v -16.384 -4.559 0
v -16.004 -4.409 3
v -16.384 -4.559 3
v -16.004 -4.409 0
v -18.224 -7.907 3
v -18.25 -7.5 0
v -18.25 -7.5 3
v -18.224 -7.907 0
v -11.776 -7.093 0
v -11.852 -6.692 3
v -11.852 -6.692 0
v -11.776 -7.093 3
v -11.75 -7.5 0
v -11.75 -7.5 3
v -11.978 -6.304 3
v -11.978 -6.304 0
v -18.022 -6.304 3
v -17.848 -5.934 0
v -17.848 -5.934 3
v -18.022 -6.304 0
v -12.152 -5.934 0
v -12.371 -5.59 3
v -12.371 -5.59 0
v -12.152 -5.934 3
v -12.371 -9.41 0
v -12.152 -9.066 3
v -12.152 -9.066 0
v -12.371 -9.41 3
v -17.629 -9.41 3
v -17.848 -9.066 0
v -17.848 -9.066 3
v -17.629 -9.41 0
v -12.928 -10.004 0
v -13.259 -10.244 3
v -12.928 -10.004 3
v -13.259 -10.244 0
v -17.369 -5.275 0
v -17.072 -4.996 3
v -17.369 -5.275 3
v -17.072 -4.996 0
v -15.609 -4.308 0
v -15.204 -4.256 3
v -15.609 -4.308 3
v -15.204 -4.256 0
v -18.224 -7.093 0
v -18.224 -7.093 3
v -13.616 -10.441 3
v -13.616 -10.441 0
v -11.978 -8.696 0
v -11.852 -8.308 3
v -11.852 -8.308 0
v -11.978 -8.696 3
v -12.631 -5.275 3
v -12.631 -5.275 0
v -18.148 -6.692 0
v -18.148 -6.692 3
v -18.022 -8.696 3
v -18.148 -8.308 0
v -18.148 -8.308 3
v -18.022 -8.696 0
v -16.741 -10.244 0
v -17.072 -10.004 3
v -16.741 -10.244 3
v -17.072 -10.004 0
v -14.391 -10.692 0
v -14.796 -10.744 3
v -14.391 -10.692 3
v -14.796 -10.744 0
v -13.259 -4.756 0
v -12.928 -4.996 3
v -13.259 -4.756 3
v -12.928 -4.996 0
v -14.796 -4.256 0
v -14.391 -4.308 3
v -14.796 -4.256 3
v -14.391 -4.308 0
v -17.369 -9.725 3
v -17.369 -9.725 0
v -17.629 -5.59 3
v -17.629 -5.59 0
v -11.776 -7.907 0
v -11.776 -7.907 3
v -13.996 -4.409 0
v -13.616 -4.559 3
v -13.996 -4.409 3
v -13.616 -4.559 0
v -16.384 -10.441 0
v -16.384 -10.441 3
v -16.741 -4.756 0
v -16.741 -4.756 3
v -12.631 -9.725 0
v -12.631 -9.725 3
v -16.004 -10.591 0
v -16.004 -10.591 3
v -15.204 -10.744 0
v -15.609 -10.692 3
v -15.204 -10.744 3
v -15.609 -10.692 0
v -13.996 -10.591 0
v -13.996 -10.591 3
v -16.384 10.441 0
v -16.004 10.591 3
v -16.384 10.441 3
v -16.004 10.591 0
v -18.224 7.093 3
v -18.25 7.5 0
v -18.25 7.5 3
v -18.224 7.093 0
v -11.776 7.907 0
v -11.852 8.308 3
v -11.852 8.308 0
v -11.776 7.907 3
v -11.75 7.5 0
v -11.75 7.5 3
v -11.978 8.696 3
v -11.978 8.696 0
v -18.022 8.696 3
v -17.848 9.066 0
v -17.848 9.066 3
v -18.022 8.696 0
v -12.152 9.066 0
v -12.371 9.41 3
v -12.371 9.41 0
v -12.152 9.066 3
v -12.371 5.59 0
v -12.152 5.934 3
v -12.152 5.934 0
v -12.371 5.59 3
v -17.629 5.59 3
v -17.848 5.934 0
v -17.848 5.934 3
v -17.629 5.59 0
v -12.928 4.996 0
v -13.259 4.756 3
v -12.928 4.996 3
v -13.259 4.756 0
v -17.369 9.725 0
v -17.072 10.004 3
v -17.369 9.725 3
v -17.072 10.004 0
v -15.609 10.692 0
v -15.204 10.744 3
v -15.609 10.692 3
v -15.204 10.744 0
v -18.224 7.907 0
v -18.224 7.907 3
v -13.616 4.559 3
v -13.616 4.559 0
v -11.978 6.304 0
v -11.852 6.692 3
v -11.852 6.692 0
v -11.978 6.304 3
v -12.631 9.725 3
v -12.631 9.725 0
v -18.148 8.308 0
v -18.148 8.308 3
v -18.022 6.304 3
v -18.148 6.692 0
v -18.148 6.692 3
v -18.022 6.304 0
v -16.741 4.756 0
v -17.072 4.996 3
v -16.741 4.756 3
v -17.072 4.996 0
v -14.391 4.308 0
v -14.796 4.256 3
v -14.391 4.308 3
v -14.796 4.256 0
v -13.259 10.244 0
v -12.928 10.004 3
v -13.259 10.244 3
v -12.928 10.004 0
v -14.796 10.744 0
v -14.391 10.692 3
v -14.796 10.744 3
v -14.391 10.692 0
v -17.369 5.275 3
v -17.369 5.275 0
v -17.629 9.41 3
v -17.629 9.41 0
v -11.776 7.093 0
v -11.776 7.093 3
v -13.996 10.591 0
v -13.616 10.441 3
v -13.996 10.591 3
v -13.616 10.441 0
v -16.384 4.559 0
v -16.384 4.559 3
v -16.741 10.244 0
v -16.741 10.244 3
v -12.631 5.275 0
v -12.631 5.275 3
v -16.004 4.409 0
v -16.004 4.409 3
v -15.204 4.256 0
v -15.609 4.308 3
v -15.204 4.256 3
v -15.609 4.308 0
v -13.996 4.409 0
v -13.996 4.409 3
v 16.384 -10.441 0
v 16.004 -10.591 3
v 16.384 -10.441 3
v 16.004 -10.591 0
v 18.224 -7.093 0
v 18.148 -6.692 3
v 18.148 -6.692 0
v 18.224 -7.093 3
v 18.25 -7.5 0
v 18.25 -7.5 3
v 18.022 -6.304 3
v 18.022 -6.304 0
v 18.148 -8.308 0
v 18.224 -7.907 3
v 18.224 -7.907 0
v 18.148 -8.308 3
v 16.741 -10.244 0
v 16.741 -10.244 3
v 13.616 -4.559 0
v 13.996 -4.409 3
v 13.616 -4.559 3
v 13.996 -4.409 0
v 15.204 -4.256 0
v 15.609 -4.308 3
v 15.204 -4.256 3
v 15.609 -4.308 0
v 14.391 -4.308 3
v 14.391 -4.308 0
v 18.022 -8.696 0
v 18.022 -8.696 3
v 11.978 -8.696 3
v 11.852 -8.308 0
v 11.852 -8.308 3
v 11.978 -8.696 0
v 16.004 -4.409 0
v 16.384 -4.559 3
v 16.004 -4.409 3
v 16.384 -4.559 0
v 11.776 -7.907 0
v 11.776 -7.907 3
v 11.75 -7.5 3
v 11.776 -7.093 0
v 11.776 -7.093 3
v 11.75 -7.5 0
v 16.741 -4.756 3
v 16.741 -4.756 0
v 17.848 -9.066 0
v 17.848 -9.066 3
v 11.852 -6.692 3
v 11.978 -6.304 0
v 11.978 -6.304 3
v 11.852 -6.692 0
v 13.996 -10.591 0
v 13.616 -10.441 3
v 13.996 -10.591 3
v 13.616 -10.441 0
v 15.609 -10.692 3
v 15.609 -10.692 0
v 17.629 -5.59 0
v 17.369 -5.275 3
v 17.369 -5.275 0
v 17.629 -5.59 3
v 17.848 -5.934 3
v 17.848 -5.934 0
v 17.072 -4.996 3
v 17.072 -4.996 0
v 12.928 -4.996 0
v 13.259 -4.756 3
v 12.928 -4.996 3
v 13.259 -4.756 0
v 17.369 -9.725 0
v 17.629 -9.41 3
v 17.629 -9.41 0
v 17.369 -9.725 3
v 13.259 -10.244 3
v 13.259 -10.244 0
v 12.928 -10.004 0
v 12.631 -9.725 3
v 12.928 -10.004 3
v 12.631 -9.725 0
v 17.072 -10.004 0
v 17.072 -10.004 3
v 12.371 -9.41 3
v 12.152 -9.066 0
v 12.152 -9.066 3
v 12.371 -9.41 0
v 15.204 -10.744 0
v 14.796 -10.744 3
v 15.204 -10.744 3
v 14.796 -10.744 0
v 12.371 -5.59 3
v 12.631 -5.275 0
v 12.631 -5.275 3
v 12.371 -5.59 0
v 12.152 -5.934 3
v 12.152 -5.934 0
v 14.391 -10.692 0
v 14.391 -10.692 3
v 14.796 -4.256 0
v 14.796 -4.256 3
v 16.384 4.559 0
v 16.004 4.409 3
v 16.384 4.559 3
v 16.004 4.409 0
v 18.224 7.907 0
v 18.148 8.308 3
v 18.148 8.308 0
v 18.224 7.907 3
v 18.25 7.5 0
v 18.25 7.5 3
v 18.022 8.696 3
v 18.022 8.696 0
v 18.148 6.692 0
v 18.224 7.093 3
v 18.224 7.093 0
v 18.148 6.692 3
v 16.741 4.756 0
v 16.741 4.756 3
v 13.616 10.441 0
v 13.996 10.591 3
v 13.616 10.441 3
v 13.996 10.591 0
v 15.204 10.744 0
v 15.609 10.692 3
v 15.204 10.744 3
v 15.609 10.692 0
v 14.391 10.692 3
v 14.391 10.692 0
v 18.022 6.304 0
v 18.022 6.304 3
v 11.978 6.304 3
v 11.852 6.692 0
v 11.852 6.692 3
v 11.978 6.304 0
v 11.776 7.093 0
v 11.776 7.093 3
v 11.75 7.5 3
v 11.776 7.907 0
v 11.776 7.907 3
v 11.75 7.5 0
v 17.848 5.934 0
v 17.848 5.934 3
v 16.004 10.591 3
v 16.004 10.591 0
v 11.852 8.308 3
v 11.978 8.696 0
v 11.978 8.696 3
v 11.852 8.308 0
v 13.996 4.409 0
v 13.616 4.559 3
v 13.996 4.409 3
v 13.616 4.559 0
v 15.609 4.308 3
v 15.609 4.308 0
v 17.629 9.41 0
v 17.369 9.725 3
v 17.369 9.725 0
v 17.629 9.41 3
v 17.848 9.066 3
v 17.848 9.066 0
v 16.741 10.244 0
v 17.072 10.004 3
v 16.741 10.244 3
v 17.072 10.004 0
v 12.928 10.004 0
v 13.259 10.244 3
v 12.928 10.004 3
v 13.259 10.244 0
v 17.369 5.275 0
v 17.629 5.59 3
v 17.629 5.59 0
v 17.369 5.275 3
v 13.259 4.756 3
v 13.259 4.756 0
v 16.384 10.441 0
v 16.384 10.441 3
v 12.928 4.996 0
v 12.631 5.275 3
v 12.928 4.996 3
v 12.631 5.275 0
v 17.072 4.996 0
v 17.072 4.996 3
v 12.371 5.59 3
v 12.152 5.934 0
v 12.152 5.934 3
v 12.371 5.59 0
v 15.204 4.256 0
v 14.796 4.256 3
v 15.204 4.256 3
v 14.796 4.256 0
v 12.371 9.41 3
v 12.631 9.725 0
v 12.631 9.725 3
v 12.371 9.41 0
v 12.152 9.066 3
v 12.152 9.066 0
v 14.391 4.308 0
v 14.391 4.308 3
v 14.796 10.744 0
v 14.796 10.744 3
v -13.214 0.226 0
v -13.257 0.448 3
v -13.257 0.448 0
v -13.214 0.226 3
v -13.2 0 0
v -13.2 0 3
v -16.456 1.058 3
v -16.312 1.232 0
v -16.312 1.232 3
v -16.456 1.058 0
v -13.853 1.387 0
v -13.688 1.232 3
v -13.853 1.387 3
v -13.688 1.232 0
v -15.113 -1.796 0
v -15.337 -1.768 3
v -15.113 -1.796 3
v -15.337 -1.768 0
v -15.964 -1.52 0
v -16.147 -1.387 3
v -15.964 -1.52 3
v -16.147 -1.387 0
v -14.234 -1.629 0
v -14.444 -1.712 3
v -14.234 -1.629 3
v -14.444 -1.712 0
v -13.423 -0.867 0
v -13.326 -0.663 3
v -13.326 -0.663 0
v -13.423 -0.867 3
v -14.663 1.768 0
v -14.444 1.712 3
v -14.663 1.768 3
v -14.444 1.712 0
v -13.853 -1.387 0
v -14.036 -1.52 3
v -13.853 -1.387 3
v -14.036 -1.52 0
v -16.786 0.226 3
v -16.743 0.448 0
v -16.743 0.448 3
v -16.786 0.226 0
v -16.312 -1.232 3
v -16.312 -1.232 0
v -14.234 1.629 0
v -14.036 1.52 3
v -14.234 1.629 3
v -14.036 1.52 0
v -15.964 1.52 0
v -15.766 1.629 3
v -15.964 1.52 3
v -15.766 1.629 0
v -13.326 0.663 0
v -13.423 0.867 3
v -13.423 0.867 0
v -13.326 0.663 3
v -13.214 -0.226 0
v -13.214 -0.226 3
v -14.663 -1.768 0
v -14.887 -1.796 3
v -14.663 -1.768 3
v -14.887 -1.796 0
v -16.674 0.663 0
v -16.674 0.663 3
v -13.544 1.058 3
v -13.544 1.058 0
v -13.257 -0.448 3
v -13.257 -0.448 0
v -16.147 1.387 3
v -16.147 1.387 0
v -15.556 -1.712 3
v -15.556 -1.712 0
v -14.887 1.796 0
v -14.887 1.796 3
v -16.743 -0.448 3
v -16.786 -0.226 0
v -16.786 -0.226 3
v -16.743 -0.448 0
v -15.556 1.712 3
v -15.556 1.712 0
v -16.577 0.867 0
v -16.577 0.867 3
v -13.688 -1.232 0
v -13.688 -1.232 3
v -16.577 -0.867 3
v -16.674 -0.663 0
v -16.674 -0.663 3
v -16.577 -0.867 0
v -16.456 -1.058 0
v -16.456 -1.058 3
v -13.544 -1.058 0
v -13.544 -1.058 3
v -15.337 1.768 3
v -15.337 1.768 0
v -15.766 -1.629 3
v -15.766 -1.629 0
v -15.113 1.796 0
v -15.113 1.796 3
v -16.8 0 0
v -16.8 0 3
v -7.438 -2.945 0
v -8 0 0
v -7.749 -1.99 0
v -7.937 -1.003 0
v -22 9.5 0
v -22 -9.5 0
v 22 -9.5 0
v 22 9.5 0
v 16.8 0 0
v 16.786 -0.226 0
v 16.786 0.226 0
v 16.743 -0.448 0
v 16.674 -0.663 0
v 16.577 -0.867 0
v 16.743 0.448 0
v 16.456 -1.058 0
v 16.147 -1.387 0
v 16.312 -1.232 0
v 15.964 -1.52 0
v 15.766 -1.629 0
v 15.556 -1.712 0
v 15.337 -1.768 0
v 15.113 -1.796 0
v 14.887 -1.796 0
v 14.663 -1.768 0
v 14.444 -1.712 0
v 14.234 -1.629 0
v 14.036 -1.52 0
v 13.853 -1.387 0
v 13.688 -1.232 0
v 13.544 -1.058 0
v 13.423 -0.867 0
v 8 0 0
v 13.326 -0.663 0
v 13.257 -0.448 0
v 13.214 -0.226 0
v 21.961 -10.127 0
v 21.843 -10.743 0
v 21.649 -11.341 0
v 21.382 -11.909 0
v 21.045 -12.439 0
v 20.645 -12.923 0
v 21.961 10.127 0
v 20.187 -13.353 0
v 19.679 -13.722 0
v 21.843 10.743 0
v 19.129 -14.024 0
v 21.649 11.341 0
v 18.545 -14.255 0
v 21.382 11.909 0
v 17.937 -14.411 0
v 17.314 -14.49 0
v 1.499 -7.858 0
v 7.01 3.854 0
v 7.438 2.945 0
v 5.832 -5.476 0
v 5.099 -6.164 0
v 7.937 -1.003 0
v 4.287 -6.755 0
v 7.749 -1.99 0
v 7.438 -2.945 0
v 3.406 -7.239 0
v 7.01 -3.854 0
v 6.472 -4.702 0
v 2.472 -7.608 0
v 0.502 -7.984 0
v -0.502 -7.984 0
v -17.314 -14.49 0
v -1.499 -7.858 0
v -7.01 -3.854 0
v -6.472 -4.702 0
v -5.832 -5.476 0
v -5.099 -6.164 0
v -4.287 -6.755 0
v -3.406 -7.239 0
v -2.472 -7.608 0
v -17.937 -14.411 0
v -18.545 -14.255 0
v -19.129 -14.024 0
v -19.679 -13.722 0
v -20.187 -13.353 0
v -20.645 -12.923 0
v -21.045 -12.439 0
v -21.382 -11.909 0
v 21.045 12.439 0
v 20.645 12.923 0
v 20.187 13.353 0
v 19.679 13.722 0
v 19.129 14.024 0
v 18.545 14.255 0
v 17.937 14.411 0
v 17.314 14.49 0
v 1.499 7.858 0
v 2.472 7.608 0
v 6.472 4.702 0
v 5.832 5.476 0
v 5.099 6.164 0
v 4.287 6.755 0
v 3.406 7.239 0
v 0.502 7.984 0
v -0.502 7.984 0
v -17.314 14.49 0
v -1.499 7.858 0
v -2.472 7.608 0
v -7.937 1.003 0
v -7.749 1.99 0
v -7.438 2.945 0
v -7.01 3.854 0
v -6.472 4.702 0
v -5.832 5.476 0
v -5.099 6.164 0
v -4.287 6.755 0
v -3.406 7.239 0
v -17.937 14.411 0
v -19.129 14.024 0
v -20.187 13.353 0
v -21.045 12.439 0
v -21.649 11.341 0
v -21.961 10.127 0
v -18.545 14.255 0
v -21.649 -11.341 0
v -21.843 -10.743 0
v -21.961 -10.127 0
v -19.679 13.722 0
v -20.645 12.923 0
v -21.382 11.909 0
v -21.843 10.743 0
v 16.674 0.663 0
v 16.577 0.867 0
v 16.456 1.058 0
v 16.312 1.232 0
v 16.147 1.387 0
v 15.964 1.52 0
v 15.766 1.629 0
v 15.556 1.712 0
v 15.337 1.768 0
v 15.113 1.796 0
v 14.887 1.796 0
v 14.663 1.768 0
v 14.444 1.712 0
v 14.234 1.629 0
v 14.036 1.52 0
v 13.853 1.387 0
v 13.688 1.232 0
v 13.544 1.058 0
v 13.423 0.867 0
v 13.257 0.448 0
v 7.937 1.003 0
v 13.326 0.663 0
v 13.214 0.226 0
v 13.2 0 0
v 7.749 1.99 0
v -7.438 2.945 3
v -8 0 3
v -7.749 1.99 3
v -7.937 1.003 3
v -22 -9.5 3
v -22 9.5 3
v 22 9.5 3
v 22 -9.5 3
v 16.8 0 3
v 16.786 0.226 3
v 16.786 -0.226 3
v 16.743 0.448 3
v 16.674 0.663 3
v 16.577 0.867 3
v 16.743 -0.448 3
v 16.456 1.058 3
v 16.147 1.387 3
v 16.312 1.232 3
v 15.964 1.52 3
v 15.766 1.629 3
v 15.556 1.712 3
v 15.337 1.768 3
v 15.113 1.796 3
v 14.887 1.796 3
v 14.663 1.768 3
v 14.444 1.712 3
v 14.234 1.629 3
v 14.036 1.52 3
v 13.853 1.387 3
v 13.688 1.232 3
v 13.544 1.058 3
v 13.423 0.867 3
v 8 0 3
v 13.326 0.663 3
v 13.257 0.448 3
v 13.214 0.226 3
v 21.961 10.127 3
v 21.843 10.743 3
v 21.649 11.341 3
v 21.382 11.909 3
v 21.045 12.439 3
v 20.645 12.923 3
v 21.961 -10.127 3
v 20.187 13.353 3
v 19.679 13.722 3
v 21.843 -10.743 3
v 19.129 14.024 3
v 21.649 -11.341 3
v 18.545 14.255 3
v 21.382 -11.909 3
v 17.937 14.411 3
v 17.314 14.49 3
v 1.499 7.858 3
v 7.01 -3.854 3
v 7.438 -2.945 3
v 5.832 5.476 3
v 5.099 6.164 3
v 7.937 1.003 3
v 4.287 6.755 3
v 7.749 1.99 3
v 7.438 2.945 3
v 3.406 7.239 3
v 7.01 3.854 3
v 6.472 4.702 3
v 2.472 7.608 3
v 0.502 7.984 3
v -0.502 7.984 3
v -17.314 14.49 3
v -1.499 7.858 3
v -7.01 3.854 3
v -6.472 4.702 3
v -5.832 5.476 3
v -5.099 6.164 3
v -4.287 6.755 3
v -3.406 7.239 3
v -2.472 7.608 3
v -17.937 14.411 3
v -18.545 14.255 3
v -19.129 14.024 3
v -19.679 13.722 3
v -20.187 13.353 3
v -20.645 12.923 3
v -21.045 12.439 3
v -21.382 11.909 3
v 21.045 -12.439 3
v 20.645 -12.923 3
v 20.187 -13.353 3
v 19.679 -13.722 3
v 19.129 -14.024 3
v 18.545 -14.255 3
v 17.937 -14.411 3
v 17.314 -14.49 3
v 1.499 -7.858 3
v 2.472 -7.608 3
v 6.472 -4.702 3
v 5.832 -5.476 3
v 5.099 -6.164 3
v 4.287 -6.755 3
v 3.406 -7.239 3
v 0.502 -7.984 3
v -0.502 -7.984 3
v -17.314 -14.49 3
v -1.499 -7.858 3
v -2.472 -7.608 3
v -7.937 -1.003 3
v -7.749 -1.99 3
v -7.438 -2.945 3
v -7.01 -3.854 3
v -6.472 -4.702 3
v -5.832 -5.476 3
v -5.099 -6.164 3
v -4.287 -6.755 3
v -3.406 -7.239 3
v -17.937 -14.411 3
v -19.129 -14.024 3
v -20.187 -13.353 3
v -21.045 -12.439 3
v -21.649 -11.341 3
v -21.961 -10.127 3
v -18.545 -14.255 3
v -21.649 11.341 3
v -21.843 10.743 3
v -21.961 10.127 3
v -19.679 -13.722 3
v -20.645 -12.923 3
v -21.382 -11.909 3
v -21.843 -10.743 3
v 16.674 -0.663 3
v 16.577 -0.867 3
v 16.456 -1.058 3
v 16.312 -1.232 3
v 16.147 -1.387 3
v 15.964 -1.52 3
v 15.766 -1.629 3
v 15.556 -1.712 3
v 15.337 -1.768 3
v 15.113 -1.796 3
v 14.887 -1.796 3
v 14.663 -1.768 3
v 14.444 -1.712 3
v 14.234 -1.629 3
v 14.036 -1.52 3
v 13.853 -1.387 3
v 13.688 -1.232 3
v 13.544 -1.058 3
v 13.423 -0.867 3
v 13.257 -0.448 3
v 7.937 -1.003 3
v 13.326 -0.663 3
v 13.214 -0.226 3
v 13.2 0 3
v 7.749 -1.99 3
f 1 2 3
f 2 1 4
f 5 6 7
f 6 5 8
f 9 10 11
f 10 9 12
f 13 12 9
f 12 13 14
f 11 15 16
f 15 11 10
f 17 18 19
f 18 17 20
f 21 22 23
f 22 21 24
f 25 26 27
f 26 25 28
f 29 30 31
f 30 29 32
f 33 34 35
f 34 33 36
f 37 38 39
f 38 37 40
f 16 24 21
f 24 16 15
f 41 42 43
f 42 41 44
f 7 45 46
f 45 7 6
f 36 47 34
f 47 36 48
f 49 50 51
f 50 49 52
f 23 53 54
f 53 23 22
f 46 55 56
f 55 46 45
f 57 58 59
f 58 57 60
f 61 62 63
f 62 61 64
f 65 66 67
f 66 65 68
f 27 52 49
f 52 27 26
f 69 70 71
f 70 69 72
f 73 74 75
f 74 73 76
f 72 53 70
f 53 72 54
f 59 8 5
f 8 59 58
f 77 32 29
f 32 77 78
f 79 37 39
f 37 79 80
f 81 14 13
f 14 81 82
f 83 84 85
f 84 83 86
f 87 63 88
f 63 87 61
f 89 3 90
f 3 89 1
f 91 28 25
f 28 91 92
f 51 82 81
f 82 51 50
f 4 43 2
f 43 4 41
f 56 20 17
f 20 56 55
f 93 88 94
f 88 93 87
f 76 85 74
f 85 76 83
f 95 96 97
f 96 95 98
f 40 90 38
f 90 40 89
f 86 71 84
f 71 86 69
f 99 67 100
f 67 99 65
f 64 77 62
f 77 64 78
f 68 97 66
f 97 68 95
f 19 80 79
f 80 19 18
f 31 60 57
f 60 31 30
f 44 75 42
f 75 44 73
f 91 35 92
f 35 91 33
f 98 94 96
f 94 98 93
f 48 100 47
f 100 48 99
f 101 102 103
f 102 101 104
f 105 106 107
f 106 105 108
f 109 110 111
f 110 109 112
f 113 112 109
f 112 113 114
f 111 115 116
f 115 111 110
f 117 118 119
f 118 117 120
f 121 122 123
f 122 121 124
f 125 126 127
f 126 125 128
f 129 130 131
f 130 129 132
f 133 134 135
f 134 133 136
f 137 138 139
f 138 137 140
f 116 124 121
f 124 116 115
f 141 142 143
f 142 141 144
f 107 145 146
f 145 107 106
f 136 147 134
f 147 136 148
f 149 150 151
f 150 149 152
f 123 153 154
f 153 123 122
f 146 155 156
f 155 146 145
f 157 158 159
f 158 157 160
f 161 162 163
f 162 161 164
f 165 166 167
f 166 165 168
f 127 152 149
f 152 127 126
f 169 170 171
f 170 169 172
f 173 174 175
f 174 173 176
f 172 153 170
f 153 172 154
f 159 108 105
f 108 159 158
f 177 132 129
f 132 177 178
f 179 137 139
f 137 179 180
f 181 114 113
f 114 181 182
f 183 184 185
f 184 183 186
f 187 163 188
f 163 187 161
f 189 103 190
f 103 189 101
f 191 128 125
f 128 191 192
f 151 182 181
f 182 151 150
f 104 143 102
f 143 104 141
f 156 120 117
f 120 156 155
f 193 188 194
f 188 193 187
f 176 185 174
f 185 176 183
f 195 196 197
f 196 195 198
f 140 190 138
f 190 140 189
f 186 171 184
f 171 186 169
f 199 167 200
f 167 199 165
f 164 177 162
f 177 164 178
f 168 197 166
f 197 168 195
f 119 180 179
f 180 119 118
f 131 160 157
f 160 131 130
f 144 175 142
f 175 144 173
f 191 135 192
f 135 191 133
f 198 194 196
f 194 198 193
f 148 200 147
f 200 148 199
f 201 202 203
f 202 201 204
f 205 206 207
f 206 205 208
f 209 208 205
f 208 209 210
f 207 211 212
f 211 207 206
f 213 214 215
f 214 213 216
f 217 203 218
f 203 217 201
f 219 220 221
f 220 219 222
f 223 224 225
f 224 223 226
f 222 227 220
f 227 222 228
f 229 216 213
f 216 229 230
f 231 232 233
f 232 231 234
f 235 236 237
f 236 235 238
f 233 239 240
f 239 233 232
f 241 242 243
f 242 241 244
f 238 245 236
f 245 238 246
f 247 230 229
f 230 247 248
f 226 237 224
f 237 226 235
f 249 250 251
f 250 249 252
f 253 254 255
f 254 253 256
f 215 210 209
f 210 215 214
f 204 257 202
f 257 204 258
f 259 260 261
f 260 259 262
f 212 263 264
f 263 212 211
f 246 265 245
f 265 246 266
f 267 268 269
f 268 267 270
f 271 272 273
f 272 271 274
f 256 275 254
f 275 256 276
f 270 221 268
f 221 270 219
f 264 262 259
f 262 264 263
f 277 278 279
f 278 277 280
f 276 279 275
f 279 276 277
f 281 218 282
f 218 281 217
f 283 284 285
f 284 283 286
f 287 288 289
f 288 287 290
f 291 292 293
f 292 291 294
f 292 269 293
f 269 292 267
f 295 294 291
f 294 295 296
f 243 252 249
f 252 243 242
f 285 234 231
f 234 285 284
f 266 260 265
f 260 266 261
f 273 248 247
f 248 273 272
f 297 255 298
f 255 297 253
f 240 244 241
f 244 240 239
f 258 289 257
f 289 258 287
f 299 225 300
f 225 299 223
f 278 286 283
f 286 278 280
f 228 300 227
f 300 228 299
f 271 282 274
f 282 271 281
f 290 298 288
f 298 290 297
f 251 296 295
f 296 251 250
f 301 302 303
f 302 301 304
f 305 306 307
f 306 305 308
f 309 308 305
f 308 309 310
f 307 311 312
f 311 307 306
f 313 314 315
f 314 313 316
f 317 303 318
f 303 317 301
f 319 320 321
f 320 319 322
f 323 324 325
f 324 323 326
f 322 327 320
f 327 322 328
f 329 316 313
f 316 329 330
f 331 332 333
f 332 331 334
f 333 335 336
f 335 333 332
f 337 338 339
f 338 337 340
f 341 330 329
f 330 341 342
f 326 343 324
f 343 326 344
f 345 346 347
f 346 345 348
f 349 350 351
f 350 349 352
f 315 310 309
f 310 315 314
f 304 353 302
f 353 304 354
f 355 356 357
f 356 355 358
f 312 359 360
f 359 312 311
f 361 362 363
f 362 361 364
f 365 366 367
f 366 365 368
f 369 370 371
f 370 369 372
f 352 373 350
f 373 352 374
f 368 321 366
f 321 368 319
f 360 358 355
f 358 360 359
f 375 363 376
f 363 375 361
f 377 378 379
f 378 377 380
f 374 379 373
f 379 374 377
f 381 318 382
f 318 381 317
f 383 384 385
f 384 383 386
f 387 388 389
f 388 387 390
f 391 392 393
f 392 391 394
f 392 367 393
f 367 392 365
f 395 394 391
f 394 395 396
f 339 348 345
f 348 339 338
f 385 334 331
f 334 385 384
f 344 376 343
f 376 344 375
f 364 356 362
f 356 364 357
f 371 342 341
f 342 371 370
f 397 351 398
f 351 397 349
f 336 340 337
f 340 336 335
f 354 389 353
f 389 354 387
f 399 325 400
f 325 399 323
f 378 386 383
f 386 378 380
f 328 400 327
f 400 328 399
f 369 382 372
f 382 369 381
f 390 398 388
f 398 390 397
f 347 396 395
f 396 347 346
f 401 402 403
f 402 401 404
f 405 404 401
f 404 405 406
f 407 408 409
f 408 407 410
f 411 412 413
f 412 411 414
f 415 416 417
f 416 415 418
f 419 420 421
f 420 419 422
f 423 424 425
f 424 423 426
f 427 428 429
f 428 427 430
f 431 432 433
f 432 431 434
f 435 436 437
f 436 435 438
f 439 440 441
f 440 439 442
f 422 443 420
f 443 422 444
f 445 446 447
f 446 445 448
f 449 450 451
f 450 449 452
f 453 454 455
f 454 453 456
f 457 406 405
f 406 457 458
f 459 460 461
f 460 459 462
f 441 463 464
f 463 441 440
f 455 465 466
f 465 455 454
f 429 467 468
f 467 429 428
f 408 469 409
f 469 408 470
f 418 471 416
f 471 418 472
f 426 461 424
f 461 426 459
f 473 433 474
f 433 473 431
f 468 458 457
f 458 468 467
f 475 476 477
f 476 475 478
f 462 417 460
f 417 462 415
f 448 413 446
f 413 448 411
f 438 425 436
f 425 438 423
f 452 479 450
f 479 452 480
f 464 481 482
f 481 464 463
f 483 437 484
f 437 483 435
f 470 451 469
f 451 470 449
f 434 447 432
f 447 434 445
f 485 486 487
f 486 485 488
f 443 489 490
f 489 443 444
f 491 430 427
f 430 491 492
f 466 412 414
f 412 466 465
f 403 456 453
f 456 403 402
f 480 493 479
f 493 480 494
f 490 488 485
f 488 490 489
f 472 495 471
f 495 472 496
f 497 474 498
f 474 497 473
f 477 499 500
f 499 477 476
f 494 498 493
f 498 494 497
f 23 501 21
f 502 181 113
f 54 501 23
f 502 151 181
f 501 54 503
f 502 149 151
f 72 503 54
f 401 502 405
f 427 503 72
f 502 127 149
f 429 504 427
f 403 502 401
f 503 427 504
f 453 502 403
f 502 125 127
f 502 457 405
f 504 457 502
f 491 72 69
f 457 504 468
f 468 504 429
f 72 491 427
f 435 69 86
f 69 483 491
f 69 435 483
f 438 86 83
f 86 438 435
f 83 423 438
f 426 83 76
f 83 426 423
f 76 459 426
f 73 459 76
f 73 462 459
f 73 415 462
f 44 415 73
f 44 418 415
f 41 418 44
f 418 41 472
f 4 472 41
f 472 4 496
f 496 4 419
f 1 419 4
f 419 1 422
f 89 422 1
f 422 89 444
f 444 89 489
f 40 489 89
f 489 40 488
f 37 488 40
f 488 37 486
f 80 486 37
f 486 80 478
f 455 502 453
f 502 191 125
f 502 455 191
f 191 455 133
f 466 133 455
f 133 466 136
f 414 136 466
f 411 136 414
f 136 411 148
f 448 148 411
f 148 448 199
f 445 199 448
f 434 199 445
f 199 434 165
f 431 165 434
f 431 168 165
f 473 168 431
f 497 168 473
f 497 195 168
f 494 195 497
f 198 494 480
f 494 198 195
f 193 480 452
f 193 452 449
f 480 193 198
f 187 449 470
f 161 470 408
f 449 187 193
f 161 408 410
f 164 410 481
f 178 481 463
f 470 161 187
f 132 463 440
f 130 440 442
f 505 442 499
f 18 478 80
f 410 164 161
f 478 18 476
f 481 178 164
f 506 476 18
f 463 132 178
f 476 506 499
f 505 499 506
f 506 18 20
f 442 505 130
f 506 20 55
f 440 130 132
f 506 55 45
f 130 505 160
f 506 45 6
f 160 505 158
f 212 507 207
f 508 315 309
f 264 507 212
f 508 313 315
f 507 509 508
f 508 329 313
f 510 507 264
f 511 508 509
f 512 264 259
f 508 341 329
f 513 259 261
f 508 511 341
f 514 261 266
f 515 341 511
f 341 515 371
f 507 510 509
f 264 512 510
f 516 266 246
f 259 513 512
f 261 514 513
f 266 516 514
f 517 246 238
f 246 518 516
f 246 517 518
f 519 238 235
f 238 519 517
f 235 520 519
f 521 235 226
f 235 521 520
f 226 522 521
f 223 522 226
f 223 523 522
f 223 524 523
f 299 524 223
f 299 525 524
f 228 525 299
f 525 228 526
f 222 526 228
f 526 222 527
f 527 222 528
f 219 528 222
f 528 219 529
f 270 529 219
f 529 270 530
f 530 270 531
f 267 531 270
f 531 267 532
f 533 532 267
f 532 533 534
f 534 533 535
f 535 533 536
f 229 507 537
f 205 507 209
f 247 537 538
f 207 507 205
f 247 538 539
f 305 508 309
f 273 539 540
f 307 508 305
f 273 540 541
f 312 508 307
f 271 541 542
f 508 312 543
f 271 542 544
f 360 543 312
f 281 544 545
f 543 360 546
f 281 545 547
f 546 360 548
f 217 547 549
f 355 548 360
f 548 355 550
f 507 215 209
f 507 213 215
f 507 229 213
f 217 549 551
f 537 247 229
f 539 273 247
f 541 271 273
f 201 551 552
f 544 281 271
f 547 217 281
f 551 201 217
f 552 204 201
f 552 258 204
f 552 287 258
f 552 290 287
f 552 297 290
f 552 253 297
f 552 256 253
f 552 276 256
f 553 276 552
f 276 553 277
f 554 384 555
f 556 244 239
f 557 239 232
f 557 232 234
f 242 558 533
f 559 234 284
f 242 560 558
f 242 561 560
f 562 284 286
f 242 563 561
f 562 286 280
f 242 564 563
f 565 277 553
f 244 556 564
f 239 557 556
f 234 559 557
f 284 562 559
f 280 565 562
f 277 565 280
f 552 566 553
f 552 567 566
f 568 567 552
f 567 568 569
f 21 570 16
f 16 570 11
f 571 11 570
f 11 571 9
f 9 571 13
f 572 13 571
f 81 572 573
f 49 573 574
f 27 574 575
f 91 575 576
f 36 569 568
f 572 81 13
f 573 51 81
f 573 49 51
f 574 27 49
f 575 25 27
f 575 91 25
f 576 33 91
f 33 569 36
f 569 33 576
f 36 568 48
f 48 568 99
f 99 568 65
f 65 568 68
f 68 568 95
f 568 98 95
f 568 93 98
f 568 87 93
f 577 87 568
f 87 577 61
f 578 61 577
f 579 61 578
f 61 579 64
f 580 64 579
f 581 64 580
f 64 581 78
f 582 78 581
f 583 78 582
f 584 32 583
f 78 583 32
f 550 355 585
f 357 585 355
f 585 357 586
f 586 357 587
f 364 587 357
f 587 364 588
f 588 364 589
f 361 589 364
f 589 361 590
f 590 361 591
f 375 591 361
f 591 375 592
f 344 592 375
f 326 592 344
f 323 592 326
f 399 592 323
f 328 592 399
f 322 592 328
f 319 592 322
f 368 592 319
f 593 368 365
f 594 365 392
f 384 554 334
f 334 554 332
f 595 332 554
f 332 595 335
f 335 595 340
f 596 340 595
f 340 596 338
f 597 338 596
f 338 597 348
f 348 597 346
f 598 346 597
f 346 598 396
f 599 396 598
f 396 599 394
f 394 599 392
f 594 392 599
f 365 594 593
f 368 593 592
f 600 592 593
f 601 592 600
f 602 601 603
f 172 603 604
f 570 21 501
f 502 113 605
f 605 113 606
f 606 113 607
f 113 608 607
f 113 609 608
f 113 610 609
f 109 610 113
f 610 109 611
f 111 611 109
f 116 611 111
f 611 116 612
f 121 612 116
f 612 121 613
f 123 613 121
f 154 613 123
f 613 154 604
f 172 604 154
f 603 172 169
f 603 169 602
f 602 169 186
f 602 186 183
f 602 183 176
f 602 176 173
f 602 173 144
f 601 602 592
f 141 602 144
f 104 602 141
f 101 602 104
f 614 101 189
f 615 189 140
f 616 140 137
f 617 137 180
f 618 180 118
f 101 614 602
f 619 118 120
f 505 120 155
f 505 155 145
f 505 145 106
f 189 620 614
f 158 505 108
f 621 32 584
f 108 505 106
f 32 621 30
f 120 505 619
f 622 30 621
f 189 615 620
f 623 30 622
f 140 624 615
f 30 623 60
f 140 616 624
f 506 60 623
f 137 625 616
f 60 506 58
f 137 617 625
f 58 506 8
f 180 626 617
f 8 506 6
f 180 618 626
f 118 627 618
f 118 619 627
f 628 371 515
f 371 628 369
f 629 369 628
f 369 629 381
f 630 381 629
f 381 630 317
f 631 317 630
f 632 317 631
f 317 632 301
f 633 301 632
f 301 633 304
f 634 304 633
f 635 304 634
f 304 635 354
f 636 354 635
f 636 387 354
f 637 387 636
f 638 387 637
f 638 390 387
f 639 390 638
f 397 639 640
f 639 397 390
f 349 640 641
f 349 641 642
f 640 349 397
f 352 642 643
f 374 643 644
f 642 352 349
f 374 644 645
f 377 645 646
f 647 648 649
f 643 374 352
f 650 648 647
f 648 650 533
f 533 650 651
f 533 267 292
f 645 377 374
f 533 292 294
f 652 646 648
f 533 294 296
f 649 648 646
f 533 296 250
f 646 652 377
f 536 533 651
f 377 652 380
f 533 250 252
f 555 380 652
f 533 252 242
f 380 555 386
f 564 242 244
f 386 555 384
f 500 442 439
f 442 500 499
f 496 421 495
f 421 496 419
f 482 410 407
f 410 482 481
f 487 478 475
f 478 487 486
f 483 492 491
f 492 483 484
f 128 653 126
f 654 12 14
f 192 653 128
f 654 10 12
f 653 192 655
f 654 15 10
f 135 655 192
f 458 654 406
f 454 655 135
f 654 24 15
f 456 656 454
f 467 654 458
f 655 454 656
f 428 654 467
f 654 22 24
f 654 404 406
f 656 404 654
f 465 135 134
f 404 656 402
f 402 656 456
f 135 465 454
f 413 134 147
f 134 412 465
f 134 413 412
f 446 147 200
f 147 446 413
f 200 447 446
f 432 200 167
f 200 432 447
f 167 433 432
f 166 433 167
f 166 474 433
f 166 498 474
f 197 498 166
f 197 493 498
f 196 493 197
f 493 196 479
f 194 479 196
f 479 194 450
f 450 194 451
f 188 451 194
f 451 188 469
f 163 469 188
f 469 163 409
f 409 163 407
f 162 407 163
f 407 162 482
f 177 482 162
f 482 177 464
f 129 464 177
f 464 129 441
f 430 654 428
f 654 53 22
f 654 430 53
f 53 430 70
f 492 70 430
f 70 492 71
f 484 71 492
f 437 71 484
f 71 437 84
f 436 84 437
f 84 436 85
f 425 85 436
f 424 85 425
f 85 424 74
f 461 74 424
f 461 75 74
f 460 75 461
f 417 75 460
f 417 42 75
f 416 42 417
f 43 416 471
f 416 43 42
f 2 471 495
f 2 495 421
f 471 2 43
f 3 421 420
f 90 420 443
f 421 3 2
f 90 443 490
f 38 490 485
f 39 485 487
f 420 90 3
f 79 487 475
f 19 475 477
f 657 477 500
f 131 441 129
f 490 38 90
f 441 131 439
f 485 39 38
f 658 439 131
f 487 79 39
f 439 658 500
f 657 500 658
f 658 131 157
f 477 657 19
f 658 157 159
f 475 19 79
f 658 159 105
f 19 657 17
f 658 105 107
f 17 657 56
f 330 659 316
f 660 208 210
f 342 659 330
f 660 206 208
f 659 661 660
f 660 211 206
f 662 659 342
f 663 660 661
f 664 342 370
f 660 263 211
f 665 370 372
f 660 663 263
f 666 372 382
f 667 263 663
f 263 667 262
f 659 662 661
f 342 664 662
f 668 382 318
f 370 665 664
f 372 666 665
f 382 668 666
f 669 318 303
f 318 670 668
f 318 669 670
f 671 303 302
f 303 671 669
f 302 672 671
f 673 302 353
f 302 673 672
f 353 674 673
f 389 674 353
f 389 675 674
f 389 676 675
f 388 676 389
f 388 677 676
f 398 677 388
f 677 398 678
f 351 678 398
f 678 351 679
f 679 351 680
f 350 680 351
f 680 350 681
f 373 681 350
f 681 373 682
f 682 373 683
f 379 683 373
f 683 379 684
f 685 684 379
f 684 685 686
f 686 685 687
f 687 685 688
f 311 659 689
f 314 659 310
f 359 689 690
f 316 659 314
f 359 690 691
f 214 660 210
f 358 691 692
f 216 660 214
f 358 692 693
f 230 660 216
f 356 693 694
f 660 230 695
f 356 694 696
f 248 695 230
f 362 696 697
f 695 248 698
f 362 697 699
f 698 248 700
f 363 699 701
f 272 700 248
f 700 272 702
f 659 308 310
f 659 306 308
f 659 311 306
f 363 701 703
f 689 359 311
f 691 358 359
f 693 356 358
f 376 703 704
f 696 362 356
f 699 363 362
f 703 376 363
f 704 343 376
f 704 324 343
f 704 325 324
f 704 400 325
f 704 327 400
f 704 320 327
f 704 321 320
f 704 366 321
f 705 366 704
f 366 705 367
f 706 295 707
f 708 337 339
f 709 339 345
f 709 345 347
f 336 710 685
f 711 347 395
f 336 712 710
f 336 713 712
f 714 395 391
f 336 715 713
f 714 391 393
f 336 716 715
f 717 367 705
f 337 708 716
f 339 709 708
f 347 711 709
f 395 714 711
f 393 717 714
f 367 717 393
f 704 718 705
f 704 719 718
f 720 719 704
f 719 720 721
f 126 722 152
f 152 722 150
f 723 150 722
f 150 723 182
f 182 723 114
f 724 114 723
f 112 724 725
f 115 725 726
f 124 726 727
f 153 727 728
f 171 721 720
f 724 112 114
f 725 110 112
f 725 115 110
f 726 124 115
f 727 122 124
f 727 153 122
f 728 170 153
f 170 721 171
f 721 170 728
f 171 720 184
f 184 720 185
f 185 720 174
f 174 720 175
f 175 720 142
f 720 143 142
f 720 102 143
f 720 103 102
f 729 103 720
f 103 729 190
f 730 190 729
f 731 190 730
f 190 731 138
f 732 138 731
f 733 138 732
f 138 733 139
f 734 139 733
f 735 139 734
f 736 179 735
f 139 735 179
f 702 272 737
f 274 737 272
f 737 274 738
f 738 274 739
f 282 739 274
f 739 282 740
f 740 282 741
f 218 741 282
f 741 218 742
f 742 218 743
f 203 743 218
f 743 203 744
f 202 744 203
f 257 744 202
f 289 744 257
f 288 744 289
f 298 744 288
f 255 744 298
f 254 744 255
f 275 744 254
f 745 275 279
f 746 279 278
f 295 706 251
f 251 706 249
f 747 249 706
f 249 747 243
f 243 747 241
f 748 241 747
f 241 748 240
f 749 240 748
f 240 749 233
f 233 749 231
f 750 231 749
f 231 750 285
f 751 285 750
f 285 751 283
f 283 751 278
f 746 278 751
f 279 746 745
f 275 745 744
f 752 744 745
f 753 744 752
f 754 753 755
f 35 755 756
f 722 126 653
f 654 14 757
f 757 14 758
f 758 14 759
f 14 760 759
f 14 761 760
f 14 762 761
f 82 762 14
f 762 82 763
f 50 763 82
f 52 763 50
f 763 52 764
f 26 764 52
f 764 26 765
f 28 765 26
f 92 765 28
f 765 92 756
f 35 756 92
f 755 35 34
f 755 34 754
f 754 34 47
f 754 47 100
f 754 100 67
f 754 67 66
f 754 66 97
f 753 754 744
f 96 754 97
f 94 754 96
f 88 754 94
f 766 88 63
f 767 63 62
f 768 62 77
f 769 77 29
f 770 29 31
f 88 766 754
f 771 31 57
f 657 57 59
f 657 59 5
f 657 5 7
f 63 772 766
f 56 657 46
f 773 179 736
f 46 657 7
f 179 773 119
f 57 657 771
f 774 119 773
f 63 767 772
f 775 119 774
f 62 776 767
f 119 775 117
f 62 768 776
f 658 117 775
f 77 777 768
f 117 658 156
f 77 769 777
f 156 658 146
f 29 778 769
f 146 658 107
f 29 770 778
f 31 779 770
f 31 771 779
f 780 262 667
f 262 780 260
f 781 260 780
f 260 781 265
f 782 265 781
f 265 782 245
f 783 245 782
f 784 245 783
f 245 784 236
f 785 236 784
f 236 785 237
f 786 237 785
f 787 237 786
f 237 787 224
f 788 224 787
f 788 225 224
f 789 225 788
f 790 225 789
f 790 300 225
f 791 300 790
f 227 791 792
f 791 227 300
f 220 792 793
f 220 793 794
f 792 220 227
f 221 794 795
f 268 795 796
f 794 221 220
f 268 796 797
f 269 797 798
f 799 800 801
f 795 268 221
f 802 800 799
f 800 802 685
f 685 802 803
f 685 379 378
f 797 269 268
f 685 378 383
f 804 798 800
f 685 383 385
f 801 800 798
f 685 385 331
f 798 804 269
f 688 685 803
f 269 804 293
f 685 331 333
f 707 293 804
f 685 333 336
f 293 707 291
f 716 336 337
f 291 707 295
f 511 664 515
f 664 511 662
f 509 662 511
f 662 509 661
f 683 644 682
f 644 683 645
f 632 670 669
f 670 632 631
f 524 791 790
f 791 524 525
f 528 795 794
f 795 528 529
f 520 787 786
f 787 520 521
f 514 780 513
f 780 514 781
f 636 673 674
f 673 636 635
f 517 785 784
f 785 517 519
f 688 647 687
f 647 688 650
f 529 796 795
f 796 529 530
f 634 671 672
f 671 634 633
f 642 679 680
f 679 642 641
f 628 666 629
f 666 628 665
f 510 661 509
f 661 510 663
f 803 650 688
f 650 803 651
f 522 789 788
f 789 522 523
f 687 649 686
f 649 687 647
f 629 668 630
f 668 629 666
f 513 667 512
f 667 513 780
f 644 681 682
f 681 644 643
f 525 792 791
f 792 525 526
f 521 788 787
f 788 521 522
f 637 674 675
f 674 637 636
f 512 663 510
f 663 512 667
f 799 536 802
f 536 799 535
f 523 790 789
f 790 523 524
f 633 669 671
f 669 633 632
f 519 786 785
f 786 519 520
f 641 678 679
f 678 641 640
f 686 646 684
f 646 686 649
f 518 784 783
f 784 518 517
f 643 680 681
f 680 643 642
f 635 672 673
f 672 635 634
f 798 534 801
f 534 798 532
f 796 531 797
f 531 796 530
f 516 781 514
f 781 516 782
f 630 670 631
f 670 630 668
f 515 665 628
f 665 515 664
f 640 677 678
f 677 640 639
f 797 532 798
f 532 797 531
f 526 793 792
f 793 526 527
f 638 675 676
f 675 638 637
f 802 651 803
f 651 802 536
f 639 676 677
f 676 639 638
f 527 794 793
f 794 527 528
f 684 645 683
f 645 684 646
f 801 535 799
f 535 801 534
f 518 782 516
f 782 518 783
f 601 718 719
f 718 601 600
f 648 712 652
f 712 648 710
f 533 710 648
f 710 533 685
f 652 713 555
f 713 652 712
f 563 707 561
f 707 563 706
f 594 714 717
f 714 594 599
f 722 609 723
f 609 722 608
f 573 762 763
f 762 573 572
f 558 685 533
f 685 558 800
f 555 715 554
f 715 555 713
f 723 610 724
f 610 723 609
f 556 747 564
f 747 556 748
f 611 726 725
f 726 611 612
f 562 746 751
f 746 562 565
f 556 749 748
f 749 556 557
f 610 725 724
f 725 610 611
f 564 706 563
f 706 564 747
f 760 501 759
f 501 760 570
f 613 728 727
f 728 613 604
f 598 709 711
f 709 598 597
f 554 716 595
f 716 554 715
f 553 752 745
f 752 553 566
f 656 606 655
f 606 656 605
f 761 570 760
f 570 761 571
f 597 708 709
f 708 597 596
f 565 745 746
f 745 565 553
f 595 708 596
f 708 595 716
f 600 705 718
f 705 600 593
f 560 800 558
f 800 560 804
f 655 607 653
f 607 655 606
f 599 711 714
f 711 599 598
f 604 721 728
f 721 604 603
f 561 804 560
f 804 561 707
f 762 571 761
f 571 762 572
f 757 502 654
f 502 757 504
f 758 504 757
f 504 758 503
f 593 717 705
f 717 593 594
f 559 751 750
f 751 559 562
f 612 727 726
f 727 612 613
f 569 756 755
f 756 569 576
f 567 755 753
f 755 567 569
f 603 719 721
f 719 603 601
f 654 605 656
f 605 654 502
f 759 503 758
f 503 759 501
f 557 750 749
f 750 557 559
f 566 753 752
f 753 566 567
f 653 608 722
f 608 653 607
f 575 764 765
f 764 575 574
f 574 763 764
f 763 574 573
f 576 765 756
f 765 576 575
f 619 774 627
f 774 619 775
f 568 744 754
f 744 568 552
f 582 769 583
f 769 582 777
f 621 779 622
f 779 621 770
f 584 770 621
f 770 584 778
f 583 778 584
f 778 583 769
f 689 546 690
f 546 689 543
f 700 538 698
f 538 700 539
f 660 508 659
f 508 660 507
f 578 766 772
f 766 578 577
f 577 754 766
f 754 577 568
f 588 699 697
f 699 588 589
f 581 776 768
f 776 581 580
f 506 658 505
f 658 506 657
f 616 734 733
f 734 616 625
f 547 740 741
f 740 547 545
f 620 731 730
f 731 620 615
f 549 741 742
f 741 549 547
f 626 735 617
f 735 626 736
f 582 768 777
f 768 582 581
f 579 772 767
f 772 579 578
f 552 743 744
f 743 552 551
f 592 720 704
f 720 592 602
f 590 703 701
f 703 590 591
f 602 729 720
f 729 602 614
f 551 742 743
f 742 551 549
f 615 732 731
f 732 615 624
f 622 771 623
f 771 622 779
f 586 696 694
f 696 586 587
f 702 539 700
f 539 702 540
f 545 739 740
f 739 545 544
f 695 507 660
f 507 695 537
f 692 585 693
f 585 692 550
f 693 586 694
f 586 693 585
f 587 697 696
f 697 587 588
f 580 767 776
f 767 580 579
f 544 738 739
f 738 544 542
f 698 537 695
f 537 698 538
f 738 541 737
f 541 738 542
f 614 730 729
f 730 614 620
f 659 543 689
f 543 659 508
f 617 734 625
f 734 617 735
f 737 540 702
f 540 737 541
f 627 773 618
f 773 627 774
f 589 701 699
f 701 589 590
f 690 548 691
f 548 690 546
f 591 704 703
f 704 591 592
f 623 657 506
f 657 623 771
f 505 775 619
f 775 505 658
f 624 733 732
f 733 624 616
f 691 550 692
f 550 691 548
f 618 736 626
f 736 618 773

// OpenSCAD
$fn = 50;


difference() {
	union() {
		hull() {
			translate(v = [-17.0000000000, 9.5000000000, 0]) {
				cylinder(h = 3, r = 5);
			}
			translate(v = [17.0000000000, 9.5000000000, 0]) {
				cylinder(h = 3, r = 5);
			}
			translate(v = [-17.0000000000, -9.5000000000, 0]) {
				cylinder(h = 3, r = 5);
			}
			translate(v = [17.0000000000, -9.5000000000, 0]) {
				cylinder(h = 3, r = 5);
			}
		}
	}
	union() {
		#translate(v = [-15.0000000000, -7.5000000000, 0]) {
			cylinder(h = 3, r = 3.2500000000);
		}
		#translate(v = [-15.0000000000, 7.5000000000, 0]) {
			cylinder(h = 3, r = 3.2500000000);
		}
		#translate(v = [15.0000000000, -7.5000000000, 0]) {
			cylinder(h = 3, r = 3.2500000000);
		}
		#translate(v = [15.0000000000, 7.5000000000, 0]) {
			cylinder(h = 3, r = 3.2500000000);
		}
		#translate(v = [-15.0000000000, -7.5000000000, -100.0000000000]) {
			cylinder(h = 200, r = 3.2500000000);
		}
		#translate(v = [-15.0000000000, 7.5000000000, -100.0000000000]) {
			cylinder(h = 200, r = 3.2500000000);
		}
		#translate(v = [15.0000000000, -7.5000000000, -100.0000000000]) {
			cylinder(h = 200, r = 3.2500000000);
		}
		#translate(v = [15.0000000000, 7.5000000000, -100.0000000000]) {
			cylinder(h = 200, r = 3.2500000000);
		}
		#translate(v = [-15.0000000000, -7.5000000000, 0]) {
			cylinder(h = 3, r = 1.8000000000);
		}
		#translate(v = [-15.0000000000, 0.0000000000, 0]) {
			cylinder(h = 3, r = 1.8000000000);
		}
		#translate(v = [-15.0000000000, 7.5000000000, 0]) {
			cylinder(h = 3, r = 1.8000000000);
		}
		#translate(v = [15.0000000000, -7.5000000000, 0]) {
			cylinder(h = 3, r = 1.8000000000);
		}
		#translate(v = [15.0000000000, 0.0000000000, 0]) {
			cylinder(h = 3, r = 1.8000000000);
		}
		#translate(v = [15.0000000000, 7.5000000000, 0]) {
			cylinder(h = 3, r = 1.8000000000);
		}
		#translate(v = [-15.0000000000, -7.5000000000, 0]) {
			cylinder(h = 3, r = 1.8000000000);
		}
		#translate(v = [-15.0000000000, 0.0000000000, 0]) {
			cylinder(h = 3, r = 1.8000000000);
		}
		#translate(v = [-15.0000000000, 7.5000000000, 0]) {
			cylinder(h = 3, r = 1.8000000000);
		}
		#translate(v = [15.0000000000, -7.5000000000, 0]) {
			cylinder(h = 3, r = 1.8000000000);
		}
		#translate(v = [15.0000000000, 0.0000000000, 0]) {
			cylinder(h = 3, r = 1.8000000000);
		}
		#translate(v = [15.0000000000, 7.5000000000, 0]) {
			cylinder(h = 3, r = 1.8000000000);
		}
		#translate(v = [-15.0000000000, -7.5000000000, 0]) {
			cylinder(h = 3, r = 1.8000000000);
		}
		#translate(v = [-15.0000000000, 0.0000000000, 0]) {
			cylinder(h = 3, r = 1.8000000000);
		}
		#translate(v = [-15.0000000000, 7.5000000000, 0]) {
			cylinder(h = 3, r = 1.8000000000);
		}
		#translate(v = [15.0000000000, -7.5000000000, 0]) {
			cylinder(h = 3, r = 1.8000000000);
		}
		#translate(v = [15.0000000000, 0.0000000000, 0]) {
			cylinder(h = 3, r = 1.8000000000);
		}
		#translate(v = [15.0000000000, 7.5000000000, 0]) {
			cylinder(h = 3, r = 1.8000000000);
		}
		#cylinder(h = 3, r = 8.0000000000);
	}
}
